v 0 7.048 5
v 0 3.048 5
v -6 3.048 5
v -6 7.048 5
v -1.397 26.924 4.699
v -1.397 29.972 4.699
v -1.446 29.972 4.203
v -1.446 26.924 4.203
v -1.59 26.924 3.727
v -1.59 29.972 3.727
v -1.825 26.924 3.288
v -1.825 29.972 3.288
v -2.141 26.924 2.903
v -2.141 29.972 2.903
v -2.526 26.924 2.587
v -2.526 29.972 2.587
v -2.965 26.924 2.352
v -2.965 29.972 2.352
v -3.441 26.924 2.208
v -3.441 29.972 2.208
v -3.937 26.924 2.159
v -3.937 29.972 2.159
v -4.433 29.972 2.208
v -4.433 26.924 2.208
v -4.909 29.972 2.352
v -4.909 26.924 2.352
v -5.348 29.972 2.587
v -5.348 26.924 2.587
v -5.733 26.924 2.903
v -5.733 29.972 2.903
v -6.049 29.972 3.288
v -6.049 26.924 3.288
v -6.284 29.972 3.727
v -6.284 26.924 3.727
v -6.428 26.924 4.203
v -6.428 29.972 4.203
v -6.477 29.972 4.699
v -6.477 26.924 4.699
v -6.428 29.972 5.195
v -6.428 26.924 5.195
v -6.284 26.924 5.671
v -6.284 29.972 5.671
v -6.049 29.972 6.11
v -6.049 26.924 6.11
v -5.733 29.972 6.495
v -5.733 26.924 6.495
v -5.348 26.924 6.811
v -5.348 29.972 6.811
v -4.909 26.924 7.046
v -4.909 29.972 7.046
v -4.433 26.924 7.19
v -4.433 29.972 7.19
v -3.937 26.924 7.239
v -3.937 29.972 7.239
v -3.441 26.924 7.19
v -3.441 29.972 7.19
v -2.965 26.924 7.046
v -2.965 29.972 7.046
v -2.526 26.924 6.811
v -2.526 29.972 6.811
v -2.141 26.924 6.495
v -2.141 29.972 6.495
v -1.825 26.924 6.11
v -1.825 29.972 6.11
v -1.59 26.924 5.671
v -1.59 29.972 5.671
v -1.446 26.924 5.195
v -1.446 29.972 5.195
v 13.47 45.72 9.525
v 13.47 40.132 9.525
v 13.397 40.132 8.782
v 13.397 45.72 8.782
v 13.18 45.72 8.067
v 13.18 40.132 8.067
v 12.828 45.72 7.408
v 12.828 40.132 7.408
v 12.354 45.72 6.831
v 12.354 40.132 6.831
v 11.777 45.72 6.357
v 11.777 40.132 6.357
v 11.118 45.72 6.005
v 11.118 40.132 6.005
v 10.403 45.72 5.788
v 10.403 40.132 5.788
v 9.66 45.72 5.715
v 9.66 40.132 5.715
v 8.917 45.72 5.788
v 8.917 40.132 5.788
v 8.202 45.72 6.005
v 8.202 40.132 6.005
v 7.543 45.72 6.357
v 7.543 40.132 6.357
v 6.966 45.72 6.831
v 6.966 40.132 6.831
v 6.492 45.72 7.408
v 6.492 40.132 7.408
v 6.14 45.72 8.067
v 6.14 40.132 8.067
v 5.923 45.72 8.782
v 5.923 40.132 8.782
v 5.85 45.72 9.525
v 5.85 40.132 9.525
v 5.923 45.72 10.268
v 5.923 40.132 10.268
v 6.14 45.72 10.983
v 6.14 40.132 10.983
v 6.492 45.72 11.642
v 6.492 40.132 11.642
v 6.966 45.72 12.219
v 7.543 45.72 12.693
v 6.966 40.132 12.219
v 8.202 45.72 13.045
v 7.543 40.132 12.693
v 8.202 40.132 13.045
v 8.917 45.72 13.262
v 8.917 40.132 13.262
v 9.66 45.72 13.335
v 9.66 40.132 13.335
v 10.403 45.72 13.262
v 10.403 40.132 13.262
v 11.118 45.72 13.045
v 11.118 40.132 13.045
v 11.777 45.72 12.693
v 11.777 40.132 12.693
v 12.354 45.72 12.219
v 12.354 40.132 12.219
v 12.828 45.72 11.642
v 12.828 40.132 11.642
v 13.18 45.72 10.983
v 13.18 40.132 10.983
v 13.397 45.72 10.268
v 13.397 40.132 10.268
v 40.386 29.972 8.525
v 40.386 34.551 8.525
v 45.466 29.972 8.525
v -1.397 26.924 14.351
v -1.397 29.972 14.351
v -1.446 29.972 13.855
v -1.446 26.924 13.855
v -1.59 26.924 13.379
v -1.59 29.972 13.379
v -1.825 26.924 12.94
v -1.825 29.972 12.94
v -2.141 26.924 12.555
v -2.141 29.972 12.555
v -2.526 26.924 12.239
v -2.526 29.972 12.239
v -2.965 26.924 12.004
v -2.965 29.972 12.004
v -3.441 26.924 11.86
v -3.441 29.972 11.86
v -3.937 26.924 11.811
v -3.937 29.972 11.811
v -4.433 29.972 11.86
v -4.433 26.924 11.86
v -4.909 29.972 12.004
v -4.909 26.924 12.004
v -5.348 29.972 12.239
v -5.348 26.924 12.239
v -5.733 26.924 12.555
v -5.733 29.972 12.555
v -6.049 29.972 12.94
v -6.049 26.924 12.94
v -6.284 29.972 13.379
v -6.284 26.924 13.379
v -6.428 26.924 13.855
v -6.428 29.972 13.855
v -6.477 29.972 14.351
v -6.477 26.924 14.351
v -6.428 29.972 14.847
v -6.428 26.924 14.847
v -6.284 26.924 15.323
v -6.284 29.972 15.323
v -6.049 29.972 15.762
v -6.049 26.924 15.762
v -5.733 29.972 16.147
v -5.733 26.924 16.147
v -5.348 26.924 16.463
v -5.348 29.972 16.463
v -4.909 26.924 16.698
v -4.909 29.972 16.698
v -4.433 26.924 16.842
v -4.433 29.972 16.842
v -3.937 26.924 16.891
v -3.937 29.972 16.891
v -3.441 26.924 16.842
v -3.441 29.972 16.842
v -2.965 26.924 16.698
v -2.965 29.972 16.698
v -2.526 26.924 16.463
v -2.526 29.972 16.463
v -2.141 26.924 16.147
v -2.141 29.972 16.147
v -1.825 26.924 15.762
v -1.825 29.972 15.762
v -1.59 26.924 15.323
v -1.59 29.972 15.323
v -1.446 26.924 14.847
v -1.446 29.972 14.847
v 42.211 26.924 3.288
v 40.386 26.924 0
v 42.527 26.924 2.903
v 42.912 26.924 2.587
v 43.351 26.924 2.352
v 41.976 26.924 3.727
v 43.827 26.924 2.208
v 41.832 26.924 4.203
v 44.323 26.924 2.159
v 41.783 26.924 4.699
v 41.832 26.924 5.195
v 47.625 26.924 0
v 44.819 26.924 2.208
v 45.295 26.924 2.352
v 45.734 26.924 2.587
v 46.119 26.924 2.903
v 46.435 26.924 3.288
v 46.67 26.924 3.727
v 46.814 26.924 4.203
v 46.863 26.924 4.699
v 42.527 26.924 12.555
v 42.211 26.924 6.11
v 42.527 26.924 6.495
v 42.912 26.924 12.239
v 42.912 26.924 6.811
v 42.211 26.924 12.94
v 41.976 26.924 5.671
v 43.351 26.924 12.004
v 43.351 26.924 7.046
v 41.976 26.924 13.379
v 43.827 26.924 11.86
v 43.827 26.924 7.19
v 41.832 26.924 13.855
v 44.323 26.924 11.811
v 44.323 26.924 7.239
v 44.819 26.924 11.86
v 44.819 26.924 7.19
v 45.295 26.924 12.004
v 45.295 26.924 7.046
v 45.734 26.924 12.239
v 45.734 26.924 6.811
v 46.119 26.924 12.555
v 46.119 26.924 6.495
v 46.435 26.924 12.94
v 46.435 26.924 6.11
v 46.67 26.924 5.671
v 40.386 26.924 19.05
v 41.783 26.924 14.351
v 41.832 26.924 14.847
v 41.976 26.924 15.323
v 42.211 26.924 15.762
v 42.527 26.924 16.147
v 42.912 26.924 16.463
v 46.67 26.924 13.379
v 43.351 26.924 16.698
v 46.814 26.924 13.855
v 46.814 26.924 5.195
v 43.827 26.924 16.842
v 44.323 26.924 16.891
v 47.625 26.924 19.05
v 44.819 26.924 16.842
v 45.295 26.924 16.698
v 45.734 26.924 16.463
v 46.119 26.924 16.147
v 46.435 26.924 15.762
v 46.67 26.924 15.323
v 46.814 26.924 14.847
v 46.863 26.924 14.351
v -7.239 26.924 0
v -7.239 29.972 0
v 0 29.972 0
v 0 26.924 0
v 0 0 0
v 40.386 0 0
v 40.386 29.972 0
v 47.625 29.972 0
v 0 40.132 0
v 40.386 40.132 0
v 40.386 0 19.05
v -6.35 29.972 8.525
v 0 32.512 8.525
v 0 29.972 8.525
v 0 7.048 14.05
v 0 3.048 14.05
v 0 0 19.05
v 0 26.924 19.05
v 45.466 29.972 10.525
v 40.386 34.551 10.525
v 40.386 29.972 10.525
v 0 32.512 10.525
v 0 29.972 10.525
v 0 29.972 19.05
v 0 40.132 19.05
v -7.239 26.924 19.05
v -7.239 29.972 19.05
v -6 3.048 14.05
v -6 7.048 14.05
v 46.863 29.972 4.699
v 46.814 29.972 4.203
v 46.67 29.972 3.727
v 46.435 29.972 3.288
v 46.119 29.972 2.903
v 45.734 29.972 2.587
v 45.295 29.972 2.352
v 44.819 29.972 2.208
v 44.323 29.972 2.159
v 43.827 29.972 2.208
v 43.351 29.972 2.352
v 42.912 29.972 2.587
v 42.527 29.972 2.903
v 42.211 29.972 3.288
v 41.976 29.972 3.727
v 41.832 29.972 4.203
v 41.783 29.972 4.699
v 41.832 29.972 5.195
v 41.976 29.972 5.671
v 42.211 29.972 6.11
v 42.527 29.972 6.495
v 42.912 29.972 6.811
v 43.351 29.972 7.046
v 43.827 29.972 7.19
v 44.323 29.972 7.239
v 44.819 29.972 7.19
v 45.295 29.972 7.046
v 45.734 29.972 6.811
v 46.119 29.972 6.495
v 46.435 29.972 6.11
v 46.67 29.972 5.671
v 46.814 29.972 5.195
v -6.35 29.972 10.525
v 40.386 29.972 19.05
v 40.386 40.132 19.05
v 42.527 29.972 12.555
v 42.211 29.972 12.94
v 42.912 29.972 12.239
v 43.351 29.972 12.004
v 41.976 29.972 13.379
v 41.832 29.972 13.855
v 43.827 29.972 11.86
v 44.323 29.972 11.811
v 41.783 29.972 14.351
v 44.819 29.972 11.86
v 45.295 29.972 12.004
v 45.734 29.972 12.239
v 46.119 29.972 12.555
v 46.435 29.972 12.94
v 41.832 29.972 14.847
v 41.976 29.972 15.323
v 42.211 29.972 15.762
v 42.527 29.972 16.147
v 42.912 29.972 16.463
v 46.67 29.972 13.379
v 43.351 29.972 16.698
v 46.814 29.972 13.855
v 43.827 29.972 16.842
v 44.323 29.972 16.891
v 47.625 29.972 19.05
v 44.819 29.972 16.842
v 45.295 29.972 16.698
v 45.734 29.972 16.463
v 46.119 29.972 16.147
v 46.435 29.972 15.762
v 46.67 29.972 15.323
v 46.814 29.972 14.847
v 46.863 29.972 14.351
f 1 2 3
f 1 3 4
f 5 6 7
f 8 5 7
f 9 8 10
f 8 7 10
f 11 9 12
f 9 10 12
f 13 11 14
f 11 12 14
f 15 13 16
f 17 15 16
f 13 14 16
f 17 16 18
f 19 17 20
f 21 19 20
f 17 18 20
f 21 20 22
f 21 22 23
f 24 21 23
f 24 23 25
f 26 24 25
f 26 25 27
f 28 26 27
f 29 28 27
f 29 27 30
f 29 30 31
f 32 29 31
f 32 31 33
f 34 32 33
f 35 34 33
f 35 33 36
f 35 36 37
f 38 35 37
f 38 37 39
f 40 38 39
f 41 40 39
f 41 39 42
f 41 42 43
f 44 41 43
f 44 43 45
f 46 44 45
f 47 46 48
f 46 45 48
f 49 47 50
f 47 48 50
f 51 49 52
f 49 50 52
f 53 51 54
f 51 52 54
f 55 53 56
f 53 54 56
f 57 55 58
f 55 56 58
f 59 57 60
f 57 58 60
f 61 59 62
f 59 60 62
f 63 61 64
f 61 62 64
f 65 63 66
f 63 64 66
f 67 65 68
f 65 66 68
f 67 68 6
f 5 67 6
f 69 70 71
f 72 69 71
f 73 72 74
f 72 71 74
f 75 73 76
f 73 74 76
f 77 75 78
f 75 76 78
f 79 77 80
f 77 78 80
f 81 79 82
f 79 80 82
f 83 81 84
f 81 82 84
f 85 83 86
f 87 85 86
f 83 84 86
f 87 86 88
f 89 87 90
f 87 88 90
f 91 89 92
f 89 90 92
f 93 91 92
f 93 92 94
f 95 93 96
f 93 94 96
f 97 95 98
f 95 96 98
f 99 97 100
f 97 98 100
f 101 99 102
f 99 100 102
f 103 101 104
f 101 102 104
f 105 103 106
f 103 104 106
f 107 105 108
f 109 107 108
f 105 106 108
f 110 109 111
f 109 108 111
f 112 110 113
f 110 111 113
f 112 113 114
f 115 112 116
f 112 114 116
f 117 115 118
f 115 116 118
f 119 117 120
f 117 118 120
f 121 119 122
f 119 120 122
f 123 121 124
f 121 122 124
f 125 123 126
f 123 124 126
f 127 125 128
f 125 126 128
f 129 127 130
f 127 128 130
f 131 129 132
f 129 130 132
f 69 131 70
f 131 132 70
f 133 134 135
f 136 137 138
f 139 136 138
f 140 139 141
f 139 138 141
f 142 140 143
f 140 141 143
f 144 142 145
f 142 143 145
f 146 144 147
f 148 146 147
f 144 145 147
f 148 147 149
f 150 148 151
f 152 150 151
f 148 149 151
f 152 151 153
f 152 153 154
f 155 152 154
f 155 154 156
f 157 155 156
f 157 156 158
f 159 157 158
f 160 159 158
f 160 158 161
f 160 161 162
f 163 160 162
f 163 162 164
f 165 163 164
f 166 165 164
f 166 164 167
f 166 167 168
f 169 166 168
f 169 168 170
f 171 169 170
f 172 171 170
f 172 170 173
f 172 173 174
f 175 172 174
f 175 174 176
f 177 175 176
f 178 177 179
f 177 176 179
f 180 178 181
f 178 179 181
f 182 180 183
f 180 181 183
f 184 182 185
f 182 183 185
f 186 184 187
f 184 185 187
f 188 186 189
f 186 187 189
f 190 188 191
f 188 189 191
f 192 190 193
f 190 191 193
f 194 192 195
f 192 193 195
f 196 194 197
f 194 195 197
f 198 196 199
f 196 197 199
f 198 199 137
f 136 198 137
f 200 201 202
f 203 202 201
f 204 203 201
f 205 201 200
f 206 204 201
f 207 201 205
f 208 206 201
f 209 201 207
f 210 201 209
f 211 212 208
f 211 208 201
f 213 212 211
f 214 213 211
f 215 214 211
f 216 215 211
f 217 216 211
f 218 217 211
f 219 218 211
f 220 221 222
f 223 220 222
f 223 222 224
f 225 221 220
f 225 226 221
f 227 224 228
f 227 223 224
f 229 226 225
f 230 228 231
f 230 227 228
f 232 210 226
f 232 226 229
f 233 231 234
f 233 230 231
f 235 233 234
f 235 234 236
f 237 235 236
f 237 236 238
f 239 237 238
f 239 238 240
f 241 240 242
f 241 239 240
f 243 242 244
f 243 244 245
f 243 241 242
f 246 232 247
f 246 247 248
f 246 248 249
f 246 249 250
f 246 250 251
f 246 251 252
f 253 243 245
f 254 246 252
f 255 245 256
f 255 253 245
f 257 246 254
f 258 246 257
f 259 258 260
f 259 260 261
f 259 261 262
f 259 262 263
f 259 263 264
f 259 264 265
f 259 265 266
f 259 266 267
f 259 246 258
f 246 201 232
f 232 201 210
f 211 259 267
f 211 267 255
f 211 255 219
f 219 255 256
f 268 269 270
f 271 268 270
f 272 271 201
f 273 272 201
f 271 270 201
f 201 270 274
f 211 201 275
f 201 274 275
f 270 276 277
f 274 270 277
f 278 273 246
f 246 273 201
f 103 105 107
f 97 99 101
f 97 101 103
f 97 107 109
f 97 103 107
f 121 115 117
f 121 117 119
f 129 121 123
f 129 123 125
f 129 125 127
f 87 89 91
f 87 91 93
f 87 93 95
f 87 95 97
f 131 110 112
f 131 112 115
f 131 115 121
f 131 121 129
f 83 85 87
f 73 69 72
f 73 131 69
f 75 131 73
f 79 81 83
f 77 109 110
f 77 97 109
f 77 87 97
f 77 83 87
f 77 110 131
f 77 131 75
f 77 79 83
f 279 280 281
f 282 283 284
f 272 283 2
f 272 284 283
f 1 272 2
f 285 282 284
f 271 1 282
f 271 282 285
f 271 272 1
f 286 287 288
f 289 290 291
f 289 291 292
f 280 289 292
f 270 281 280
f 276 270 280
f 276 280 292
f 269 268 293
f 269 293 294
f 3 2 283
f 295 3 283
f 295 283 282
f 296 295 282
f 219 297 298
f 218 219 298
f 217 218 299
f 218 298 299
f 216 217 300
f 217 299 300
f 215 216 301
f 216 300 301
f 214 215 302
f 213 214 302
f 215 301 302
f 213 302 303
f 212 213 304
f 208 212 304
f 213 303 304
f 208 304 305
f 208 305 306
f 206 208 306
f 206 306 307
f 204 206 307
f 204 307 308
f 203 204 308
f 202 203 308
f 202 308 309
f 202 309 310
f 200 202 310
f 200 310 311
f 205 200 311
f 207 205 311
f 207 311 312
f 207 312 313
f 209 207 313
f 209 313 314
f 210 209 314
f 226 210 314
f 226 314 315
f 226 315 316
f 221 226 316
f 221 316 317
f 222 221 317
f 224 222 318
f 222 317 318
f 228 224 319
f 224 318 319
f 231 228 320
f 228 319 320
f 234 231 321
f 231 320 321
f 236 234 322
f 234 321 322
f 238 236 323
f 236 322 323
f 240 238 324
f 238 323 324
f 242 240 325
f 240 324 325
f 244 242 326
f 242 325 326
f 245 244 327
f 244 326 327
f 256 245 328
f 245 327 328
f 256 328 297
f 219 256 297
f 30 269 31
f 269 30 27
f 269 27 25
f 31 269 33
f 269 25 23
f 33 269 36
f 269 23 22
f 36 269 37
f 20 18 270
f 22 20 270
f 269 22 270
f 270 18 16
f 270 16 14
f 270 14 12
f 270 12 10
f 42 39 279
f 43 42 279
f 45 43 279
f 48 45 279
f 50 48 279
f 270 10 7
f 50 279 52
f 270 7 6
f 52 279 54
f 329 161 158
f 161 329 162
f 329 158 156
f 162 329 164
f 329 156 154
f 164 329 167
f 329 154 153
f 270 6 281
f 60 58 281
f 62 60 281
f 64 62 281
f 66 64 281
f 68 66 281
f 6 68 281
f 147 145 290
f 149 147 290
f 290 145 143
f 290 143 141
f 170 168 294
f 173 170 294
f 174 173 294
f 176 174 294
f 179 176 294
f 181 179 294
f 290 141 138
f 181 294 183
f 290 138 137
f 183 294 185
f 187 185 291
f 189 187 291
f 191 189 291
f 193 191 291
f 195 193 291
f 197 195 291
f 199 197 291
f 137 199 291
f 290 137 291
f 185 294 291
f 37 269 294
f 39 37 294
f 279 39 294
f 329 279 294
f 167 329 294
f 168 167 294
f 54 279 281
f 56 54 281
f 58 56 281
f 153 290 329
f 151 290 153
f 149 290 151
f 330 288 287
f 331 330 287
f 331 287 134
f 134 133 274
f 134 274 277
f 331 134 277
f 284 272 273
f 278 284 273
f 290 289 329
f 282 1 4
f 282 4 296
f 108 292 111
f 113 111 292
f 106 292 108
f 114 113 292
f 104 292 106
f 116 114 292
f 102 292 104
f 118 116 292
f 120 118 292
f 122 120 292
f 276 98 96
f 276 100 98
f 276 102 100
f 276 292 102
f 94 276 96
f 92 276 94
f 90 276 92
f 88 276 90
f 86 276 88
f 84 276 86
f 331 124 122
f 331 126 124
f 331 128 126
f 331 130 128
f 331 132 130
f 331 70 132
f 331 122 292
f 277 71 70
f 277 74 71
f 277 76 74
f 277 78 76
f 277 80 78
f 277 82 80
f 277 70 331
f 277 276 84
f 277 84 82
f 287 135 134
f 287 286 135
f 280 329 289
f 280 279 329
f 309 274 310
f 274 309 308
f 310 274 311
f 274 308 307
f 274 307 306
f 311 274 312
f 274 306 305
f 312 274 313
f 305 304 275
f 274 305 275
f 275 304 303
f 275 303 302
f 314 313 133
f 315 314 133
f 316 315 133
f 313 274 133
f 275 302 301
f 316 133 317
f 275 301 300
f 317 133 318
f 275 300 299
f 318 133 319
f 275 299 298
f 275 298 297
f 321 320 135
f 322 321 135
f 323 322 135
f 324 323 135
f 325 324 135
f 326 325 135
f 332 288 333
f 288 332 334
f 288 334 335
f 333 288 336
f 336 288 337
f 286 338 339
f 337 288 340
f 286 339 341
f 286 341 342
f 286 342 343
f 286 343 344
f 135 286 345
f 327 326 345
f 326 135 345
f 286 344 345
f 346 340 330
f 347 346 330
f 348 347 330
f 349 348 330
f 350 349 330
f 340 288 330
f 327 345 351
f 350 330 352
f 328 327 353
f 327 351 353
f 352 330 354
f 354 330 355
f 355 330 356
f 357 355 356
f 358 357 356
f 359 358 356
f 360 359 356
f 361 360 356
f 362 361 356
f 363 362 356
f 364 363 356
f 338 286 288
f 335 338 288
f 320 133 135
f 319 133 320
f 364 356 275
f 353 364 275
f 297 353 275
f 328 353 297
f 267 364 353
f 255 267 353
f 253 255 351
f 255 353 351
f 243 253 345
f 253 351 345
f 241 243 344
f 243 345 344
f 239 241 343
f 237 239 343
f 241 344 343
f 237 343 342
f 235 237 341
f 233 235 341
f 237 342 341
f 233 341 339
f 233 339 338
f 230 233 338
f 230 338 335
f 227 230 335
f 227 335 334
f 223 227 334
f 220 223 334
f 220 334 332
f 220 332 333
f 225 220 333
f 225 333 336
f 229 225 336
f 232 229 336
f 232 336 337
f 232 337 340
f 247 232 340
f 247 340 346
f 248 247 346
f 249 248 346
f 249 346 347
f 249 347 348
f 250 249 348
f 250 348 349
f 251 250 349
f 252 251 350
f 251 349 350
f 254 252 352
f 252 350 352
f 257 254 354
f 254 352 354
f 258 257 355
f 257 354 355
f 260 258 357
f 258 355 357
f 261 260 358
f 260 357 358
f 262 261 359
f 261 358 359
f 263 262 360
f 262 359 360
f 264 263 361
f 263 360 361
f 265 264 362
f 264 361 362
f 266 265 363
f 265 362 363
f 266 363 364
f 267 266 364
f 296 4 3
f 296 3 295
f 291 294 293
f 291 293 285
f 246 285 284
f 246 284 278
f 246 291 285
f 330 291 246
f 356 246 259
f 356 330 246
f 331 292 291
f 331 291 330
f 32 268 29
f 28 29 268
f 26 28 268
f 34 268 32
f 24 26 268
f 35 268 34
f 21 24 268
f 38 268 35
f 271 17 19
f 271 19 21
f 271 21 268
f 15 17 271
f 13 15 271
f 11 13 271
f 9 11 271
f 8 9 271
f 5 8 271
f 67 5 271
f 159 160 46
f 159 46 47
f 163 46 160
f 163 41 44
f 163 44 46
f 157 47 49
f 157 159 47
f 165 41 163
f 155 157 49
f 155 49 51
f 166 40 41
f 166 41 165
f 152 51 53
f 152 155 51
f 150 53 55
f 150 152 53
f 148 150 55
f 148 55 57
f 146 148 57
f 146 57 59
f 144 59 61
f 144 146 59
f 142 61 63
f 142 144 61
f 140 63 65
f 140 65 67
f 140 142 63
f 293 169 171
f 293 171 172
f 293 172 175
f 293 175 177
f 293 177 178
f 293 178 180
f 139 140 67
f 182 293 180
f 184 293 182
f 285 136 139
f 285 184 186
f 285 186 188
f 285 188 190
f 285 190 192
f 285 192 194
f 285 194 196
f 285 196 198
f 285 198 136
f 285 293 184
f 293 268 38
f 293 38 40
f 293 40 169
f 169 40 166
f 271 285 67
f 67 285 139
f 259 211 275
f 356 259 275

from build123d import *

# Parameters (mm, degrees)
SKETCH1_W               = 40.386
SKETCH1_H               = 40.132
BOSS_EXTRUDE1_DEPTH     = 19.05
SKETCH2_W               = 7.239
SKETCH2_H               = 3.048
BOSS_EXTRUDE2_DEPTH     = 19.05
SKETCH3_R               = 2.54
CUT_EXTRUDE1_DEPTH      = 11.16
CUT_EXTRUDE1_DEPTH_BACK = 30.972
SKETCH4_R               = 3.81
BOSS_EXTRUDE3_DEPTH     = 5.588
SKETCH5_W               = 9.05
SKETCH5_H               = 4
BOSS_EXTRUDE4_DEPTH     = 6
BOSS_EXTRUDE5_DEPTH     = 1


with BuildPart() as part:
    # Sketch1 → Boss-Extrude1 (new body)
    with BuildSketch(Plane.XY):
        with Locations((20.193, 20.066)):
            Rectangle(SKETCH1_W, SKETCH1_H)
    extrude(amount=BOSS_EXTRUDE1_DEPTH)

    # Sketch2 → Boss-Extrude2 (add)
    with BuildSketch(Plane.XY.offset(19.05)):
        with Locations((-3.6195, 28.448)):
            Rectangle(SKETCH2_W, SKETCH2_H)
        with Locations((44.0055, 28.448)):
            Rectangle(SKETCH2_W, SKETCH2_H)
    extrude(amount=-BOSS_EXTRUDE2_DEPTH)

    # Sketch3 → Cut-Extrude1 (cut, two sides)
    with BuildSketch(Plane(origin=(0, 29.972, 0), x_dir=(1, 0, 0), z_dir=(0, 1, 0))) as cut_extrude1_sk:
        with Locations((-3.937, -14.351)):
            Circle(SKETCH3_R)
        with Locations((-3.937, -4.699)):
            Circle(SKETCH3_R)
        with Locations((44.323, -14.351)):
            Circle(SKETCH3_R)
        with Locations((44.323, -4.699)):
            Circle(SKETCH3_R)
    extrude(amount=CUT_EXTRUDE1_DEPTH, mode=Mode.SUBTRACT)
    extrude(cut_extrude1_sk.sketch, amount=-CUT_EXTRUDE1_DEPTH_BACK, mode=Mode.SUBTRACT)

    # Sketch4 → Boss-Extrude3 (add)
    with BuildSketch(Plane(origin=(0, 40.132, 0), x_dir=(1, 0, 0), z_dir=(0, 1, 0))):
        with Locations((9.66, -9.525)):
            Circle(SKETCH4_R)
    extrude(amount=BOSS_EXTRUDE3_DEPTH)

    # Sketch5 → Boss-Extrude4 (add)
    with BuildSketch(Plane.ZY):
        with Locations((9.525, 5.048)):
            Rectangle(SKETCH5_W, SKETCH5_H)
    extrude(amount=BOSS_EXTRUDE4_DEPTH)

    # Sketch7 → Boss-Extrude5 (add, symmetric)
    with BuildSketch(Plane.XY.offset(9.525)):
        Polygon((-6.35, 29.972), (0, 32.512), (0, 29.972), align=None)
        Polygon((45.466, 29.972), (40.386, 34.55105012), (40.386, 29.972), align=None)
    extrude(amount=BOSS_EXTRUDE5_DEPTH, both=True)


solid = part.part
